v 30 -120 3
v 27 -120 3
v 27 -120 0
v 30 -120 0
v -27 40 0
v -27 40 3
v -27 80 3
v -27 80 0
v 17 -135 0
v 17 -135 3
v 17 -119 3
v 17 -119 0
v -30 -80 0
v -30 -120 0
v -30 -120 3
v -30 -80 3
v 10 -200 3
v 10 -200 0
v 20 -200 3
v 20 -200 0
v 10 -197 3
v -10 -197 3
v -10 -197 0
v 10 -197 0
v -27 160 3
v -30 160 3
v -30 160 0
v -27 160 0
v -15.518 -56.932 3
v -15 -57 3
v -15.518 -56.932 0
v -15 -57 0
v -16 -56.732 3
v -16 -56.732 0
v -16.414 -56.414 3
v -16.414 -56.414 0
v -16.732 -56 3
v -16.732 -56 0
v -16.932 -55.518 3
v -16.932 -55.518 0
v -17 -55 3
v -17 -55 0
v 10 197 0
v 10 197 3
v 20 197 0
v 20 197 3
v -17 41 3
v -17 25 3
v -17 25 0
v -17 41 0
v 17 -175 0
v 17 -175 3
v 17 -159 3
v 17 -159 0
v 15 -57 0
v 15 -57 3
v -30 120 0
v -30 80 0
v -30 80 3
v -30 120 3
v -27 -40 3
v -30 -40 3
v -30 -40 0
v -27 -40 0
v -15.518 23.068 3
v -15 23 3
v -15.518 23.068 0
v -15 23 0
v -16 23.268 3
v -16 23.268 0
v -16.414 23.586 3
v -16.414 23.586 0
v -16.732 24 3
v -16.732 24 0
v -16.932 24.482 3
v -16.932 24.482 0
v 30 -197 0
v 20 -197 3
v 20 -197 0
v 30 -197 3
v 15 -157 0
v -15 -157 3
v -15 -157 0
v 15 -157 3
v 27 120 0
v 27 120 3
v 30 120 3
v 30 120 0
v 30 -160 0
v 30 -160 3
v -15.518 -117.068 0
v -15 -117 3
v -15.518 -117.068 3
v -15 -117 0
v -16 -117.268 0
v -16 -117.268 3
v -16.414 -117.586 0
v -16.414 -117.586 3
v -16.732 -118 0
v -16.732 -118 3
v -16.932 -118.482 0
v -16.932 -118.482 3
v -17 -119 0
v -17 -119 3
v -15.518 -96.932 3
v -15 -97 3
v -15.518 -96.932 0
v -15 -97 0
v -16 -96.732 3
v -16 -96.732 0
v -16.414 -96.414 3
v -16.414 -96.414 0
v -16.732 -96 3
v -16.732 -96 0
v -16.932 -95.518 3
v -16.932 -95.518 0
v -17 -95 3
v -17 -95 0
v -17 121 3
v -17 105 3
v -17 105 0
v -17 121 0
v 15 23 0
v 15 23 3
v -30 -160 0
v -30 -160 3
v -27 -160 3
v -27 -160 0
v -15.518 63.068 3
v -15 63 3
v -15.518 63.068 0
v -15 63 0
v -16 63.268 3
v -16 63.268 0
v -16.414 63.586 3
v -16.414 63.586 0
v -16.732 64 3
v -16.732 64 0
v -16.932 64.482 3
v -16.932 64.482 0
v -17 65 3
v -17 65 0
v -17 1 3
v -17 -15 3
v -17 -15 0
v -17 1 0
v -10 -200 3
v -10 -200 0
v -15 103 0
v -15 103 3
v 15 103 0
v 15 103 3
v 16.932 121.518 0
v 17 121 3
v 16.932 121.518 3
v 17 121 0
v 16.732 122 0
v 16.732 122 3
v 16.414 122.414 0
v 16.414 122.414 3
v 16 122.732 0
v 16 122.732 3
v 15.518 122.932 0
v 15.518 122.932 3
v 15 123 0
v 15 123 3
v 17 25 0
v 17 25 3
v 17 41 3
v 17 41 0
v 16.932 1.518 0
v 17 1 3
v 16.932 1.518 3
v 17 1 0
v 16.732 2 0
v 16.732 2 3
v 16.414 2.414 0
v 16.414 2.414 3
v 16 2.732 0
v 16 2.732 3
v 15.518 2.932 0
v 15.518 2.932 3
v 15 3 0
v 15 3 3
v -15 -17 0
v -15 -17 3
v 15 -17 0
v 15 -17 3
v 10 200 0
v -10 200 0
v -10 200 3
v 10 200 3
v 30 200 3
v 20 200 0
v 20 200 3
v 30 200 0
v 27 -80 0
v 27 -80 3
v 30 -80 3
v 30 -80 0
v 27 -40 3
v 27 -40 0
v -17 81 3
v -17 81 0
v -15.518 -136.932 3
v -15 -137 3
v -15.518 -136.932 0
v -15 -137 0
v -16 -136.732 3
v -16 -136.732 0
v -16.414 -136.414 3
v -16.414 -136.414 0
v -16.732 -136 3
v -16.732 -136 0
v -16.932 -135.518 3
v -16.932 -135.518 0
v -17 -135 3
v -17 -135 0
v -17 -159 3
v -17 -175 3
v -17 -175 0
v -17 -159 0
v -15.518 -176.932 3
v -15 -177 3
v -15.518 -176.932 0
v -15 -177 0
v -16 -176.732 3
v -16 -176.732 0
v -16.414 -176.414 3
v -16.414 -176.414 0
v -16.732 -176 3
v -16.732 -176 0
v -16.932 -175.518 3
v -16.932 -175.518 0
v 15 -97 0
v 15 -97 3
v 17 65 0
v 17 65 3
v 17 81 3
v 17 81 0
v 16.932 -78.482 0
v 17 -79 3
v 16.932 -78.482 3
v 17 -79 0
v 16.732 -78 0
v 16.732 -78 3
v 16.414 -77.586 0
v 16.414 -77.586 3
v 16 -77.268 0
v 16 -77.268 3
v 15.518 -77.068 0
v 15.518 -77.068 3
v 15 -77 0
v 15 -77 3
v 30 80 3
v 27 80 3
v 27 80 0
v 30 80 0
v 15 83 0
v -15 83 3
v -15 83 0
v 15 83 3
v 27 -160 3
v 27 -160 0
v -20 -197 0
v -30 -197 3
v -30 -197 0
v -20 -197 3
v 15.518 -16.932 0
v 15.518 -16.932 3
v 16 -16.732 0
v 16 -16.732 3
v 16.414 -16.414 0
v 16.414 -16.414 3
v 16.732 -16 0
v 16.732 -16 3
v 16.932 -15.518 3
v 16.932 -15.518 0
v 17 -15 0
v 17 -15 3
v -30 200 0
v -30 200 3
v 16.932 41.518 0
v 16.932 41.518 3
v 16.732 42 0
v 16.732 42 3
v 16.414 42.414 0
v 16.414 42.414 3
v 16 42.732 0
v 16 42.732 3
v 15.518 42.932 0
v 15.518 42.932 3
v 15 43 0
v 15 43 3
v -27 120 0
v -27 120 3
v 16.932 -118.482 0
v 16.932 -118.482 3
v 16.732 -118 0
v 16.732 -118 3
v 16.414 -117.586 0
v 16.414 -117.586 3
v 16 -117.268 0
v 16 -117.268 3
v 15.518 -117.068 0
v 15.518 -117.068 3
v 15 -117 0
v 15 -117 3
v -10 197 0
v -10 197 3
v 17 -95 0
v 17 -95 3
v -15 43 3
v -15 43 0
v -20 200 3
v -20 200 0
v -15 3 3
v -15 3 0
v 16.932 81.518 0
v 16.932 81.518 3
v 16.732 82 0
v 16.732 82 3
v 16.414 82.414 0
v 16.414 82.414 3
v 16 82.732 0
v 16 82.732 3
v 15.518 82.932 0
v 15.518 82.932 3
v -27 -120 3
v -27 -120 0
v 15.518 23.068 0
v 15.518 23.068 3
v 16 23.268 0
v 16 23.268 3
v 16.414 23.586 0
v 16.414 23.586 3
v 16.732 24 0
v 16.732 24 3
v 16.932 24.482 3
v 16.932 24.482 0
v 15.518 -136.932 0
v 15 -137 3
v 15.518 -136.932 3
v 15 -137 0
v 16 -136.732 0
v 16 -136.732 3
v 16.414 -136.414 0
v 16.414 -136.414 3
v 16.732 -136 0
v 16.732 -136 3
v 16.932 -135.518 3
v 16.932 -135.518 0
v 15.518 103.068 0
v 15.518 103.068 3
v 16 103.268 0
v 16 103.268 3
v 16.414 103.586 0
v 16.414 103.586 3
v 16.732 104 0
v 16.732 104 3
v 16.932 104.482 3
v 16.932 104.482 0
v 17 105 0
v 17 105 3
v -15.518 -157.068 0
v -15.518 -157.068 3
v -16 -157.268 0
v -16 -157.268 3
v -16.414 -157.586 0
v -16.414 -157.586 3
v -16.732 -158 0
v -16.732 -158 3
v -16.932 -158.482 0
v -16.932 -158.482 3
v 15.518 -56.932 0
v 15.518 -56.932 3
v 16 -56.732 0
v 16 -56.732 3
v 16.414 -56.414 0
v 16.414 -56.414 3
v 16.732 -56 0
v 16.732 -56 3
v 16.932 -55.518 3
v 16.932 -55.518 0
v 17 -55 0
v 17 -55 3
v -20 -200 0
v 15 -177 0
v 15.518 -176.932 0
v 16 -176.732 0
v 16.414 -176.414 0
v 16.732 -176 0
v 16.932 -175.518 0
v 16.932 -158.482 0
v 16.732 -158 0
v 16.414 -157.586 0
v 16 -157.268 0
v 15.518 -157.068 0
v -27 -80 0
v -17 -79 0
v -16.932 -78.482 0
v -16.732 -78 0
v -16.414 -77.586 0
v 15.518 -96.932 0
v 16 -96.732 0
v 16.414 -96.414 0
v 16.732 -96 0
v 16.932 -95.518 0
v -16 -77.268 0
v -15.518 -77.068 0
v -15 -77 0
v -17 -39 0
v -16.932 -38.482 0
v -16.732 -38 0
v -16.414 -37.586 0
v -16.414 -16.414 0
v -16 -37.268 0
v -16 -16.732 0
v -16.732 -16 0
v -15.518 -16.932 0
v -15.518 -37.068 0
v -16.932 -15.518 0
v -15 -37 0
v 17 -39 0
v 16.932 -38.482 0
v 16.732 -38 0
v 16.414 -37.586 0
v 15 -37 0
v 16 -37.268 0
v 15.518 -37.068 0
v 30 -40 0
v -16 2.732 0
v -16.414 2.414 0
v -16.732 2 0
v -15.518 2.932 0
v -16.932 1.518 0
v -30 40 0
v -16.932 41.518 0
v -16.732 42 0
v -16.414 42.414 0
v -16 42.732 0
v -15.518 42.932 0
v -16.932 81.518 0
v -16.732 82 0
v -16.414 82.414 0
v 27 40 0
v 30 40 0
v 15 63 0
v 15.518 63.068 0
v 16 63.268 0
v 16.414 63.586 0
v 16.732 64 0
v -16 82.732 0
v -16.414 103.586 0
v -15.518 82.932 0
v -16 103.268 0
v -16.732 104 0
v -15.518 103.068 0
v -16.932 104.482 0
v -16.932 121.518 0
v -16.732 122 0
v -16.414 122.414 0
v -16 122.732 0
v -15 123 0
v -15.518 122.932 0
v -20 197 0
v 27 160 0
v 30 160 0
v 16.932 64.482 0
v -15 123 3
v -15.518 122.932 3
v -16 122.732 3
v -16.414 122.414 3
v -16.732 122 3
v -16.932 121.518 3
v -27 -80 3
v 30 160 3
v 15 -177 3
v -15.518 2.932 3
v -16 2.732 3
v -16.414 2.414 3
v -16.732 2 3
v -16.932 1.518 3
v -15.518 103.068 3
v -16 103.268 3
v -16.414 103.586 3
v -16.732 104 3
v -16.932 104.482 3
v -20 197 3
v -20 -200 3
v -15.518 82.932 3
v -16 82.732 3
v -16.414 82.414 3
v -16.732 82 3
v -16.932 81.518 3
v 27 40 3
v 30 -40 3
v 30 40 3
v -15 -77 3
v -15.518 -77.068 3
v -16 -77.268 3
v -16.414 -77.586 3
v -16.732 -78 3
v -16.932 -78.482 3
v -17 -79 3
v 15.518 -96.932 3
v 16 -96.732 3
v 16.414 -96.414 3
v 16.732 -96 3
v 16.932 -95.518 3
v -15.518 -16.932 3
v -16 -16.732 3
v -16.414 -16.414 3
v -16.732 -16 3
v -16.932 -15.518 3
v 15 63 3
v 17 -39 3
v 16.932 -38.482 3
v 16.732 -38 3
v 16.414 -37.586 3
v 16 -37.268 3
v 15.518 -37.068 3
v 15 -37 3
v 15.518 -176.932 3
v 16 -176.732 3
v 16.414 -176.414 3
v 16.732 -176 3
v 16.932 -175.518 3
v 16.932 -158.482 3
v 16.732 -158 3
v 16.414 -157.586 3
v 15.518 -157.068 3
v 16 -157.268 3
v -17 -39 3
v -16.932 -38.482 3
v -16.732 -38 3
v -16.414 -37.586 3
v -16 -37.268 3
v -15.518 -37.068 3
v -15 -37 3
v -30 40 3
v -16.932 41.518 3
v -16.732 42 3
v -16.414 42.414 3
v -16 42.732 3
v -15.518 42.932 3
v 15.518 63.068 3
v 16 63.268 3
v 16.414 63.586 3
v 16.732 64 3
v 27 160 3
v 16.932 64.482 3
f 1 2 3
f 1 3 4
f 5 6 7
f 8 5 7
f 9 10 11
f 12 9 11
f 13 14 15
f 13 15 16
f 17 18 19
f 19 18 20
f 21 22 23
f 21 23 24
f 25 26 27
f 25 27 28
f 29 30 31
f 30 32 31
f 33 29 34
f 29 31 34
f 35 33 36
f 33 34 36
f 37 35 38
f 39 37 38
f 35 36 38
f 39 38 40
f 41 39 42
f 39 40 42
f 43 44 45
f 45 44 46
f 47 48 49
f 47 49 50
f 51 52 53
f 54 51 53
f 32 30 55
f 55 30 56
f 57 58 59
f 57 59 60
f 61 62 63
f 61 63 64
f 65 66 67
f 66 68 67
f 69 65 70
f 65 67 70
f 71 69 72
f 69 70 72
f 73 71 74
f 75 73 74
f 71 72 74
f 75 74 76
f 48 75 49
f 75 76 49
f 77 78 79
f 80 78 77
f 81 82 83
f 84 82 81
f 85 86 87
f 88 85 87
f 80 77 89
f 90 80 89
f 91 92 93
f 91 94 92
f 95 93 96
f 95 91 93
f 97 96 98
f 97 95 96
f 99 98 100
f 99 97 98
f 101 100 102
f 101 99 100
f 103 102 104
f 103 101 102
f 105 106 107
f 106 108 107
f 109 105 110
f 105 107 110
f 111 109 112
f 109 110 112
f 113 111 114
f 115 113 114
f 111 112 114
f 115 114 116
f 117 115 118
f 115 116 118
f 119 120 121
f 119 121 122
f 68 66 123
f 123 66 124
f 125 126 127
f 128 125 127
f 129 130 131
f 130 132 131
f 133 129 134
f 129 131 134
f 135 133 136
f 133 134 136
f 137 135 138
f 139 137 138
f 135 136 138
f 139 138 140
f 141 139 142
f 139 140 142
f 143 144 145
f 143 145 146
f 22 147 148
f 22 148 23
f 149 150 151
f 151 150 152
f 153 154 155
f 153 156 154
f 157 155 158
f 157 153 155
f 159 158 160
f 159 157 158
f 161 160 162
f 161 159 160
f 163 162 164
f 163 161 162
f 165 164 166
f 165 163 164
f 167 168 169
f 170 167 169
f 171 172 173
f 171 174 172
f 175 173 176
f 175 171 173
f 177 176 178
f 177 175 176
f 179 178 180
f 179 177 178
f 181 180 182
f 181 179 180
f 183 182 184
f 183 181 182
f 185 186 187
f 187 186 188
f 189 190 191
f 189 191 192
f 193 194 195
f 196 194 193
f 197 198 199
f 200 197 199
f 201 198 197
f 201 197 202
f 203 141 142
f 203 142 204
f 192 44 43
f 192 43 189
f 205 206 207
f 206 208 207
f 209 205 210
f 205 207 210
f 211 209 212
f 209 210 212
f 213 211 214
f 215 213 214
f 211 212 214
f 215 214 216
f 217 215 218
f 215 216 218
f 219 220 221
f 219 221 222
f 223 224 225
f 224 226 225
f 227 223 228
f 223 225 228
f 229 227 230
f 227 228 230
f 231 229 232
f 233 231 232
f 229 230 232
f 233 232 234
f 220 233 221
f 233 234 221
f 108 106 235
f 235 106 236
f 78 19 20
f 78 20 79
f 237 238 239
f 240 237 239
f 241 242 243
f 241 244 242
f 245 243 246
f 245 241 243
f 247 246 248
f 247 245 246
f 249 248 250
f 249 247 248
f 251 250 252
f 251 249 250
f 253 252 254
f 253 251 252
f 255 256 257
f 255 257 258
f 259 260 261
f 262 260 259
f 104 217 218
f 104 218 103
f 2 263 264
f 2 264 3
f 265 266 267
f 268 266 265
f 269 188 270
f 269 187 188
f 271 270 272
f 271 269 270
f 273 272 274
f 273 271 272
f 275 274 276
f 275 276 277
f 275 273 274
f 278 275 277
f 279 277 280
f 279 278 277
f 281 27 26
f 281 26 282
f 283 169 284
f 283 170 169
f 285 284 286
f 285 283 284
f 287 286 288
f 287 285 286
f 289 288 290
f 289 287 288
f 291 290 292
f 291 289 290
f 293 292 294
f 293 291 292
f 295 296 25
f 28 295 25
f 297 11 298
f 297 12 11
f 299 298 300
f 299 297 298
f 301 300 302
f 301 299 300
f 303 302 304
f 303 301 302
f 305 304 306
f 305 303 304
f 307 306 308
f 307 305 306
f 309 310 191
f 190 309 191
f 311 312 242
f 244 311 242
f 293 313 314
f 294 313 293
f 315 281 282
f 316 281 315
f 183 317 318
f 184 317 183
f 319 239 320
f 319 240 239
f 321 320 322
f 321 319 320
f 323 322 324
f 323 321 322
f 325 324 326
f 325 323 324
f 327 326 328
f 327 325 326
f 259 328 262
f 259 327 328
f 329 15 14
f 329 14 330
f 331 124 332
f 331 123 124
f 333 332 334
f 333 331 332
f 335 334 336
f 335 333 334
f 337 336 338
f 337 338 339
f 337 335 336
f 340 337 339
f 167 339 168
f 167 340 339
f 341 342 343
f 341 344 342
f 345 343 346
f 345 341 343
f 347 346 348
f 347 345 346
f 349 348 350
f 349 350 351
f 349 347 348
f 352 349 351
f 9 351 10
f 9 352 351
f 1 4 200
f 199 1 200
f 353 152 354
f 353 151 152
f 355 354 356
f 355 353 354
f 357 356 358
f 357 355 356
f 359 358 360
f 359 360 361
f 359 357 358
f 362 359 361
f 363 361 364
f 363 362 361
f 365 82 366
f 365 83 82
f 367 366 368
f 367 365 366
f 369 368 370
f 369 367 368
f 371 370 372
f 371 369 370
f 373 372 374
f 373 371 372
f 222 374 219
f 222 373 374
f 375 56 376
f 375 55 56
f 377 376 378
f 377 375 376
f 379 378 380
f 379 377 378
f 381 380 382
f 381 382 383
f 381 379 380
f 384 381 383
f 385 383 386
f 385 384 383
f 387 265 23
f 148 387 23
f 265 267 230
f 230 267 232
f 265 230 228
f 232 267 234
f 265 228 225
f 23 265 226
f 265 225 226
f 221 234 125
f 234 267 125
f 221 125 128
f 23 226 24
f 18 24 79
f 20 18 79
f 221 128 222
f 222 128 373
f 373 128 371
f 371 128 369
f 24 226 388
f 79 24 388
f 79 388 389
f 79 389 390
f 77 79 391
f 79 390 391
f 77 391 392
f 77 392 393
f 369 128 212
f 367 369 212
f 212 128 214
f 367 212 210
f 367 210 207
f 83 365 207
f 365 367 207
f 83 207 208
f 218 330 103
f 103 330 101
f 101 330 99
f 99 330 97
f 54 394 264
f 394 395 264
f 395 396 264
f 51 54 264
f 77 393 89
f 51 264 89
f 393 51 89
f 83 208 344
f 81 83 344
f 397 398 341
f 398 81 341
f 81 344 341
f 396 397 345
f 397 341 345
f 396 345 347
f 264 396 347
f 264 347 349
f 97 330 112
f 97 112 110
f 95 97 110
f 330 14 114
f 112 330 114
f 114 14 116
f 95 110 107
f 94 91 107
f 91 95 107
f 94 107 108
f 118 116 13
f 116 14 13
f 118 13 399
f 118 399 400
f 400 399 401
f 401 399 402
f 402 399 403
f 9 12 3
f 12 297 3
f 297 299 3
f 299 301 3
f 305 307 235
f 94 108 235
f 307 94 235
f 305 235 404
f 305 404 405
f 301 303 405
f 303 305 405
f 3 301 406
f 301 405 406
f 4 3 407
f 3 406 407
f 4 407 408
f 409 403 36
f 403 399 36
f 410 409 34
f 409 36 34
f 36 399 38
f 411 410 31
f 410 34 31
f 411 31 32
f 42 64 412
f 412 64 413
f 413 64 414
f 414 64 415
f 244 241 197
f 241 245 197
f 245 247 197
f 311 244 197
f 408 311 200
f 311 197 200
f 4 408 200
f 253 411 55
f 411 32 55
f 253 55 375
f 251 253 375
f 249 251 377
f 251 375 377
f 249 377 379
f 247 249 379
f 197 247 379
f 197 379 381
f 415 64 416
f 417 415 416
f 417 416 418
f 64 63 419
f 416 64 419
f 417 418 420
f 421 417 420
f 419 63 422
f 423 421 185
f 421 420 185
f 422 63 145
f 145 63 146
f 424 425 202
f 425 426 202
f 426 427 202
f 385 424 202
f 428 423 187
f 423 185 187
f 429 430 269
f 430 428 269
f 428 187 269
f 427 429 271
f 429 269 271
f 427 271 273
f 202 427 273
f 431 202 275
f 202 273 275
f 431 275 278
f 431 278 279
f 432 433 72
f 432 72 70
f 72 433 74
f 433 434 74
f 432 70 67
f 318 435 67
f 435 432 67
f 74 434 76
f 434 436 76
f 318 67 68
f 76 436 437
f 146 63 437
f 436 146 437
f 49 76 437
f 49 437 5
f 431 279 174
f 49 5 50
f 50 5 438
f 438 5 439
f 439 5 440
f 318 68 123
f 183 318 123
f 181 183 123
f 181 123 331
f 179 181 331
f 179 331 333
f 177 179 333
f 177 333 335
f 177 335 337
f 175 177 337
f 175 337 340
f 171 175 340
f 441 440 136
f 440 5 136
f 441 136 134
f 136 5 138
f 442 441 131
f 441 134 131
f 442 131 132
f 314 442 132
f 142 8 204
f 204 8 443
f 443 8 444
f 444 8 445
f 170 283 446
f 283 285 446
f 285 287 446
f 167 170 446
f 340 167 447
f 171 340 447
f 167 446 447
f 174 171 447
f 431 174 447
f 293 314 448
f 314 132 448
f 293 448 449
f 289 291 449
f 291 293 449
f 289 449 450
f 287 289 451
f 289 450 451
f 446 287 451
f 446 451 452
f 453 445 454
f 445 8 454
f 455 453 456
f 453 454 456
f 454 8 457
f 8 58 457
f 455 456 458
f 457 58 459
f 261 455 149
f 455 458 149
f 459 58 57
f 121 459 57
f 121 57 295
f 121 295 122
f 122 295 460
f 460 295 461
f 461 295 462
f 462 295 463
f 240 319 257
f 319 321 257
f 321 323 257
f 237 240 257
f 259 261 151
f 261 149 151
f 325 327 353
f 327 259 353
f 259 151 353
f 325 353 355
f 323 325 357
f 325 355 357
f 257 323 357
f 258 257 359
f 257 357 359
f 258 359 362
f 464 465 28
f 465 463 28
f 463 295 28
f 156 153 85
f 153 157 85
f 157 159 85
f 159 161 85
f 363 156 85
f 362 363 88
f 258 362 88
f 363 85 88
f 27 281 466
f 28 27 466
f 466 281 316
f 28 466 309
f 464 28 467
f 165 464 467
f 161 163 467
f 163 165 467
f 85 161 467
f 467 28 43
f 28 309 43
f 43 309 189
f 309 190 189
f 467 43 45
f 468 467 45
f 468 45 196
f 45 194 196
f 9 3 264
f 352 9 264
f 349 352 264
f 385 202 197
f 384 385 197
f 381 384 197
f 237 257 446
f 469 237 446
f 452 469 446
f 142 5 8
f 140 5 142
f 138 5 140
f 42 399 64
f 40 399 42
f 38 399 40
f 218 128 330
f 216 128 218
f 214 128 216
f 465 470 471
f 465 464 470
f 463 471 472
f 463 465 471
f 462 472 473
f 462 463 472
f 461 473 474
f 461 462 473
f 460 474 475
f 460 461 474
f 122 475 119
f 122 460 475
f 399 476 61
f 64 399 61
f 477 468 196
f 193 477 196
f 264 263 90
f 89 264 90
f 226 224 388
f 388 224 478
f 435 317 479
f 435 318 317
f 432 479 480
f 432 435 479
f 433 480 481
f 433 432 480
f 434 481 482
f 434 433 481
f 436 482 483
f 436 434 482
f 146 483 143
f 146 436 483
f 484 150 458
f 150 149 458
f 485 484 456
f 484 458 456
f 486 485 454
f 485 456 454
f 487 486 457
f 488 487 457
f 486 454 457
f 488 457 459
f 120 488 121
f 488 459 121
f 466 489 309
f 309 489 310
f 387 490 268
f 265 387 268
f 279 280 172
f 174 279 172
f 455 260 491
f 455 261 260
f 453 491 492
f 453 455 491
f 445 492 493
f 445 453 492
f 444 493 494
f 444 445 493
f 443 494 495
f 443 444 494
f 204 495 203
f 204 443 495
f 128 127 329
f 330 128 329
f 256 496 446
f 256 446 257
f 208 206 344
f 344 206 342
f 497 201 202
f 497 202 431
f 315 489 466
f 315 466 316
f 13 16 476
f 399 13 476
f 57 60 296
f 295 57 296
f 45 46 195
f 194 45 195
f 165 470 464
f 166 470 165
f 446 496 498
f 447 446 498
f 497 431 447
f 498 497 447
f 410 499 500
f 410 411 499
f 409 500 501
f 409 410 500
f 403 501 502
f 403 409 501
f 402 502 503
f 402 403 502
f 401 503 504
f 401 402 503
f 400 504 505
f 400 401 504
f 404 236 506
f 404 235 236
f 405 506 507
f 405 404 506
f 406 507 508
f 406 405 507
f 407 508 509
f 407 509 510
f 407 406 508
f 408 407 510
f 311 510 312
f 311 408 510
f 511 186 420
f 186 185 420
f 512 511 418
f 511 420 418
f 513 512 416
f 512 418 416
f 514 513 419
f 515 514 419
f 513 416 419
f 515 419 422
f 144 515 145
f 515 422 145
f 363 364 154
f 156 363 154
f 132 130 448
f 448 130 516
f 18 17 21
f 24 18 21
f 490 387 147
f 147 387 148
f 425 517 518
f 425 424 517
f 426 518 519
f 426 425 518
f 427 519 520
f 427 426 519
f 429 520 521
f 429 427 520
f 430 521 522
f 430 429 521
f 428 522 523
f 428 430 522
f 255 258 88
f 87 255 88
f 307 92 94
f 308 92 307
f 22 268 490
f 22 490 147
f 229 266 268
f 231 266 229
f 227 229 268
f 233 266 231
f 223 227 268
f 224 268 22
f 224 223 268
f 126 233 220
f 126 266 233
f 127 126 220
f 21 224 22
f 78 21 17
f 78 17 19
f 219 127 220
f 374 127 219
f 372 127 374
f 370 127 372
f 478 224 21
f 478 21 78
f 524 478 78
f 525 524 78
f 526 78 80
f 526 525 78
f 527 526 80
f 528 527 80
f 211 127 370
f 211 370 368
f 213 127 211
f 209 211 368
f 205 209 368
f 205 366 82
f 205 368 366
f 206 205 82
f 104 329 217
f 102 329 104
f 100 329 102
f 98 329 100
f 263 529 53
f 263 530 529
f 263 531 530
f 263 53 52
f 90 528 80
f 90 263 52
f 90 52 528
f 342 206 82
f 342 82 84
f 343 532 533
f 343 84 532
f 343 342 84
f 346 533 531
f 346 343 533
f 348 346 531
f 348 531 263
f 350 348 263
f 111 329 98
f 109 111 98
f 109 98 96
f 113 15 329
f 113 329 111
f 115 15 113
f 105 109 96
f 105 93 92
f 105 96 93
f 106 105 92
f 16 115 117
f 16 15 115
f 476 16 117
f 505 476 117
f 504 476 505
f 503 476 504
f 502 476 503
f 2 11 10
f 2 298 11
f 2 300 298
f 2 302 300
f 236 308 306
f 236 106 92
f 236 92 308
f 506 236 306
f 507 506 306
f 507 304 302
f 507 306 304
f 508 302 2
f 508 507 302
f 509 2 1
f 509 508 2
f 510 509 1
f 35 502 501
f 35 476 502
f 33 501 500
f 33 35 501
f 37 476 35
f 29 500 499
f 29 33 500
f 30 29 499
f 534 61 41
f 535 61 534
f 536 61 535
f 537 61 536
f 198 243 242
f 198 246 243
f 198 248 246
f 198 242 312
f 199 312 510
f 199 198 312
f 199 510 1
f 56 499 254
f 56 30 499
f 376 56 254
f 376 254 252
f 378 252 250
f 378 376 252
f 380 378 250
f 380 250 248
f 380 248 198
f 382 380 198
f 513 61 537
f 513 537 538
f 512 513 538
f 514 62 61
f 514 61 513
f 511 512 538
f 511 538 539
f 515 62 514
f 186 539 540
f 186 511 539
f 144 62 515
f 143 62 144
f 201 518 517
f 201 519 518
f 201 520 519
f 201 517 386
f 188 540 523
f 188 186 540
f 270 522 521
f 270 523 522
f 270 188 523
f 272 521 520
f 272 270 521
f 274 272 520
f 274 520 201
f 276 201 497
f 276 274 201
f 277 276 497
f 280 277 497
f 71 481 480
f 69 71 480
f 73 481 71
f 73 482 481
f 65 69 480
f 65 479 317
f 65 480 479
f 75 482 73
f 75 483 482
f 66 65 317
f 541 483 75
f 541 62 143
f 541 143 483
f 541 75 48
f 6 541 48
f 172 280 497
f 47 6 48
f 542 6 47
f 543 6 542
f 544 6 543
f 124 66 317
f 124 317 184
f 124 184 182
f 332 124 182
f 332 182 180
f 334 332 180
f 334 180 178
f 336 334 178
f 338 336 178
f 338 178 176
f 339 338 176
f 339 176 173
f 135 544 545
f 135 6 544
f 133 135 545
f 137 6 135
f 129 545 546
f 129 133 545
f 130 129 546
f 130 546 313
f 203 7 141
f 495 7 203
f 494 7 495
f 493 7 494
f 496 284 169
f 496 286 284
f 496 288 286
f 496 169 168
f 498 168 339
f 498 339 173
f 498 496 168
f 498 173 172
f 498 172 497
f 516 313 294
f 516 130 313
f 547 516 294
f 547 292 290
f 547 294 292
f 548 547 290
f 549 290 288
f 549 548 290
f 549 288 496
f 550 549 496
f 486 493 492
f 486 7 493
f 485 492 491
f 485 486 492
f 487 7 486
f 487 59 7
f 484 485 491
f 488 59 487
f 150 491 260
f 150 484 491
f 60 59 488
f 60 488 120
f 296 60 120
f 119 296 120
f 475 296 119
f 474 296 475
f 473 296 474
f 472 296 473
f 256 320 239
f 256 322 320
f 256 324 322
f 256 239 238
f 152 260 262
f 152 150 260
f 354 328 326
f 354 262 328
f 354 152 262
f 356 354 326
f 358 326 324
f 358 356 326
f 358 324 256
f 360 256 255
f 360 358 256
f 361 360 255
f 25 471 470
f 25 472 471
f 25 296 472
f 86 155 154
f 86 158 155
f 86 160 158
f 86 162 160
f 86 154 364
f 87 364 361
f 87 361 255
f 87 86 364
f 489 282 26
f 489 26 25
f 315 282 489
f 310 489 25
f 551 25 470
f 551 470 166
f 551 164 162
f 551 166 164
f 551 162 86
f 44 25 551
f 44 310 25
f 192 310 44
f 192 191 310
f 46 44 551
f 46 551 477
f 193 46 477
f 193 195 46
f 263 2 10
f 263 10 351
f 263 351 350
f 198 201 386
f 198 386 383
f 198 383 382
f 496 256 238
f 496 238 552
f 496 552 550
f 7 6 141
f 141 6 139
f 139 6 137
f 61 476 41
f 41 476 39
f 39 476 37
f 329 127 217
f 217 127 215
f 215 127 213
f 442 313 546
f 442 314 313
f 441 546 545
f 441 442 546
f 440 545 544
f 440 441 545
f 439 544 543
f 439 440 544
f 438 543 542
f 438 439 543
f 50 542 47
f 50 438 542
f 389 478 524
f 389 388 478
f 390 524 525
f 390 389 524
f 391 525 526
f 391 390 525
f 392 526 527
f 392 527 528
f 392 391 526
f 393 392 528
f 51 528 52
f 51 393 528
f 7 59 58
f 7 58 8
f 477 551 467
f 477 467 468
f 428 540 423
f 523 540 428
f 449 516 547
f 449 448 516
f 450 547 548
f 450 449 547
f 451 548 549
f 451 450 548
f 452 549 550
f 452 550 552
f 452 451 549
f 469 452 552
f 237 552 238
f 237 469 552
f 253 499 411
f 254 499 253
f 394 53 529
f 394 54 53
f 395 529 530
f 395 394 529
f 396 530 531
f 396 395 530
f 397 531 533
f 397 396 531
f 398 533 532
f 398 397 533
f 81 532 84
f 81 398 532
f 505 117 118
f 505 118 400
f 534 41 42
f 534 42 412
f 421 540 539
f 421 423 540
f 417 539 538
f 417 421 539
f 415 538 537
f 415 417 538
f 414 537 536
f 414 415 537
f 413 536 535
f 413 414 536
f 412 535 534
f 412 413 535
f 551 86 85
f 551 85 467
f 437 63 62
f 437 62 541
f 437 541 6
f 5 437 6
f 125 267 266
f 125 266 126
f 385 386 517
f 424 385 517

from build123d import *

# Parameters (mm, degrees)
SKETCH1_W           = 60
SKETCH1_H           = 400
BOSS_EXTRUDE1_DEPTH = 3
SKETCH2_W           = 3
SKETCH2_H           = 40
SKETCH2_W_2         = 10
SKETCH2_H_2         = 3
SKETCH2_W_3         = 7
SKETCH2_W_4         = 20
CUT_EXTRUDE3_DEPTH  = 3
SKETCH3_W           = 3
SKETCH3_H           = 3
CUT_EXTRUDE4_DEPTH  = 3
SKETCH4_W           = 34
SKETCH4_H           = 20
CUT_EXTRUDE5_DEPTH  = 3
FILLET1_R           = 2


with BuildPart() as part:
    # Sketch1 → Boss-Extrude1 (new body)
    with BuildSketch(Plane.XY):
        Rectangle(SKETCH1_W, SKETCH1_H)
    extrude(amount=BOSS_EXTRUDE1_DEPTH)

    # Sketch2 → Cut-Extrude3 (cut)
    with BuildSketch(Plane.XY.offset(3)):
        with Locations((-28.5, 60)):
            Rectangle(SKETCH2_W, SKETCH2_H)
        with Locations((-28.5, -60)):
            Rectangle(SKETCH2_W, SKETCH2_H)
        with Locations((-28.5, 140)):
            Rectangle(SKETCH2_W, SKETCH2_H)
        with Locations((-28.5, -140)):
            Rectangle(SKETCH2_W, SKETCH2_H)
        with Locations((-15, 198.5)):
            Rectangle(SKETCH2_W_2, SKETCH2_H_2)
        with Locations((-23.5, -198.5)):
            Rectangle(SKETCH2_W_3, SKETCH2_H_2)
        with Locations((15, 198.5)):
            Rectangle(SKETCH2_W_2, SKETCH2_H_2)
        with Locations((0, -198.5)):
            Rectangle(SKETCH2_W_4, SKETCH2_H_2)
        with Locations((23.5, -198.5)):
            Rectangle(SKETCH2_W_3, SKETCH2_H_2)
        with Locations((28.5, 140)):
            Rectangle(SKETCH2_W, SKETCH2_H)
        with Locations((28.5, -140)):
            Rectangle(SKETCH2_W, SKETCH2_H)
        with Locations((28.5, 60)):
            Rectangle(SKETCH2_W, SKETCH2_H)
        with Locations((28.5, -60)):
            Rectangle(SKETCH2_W, SKETCH2_H)
    extrude(amount=-CUT_EXTRUDE3_DEPTH, mode=Mode.SUBTRACT)

    # Sketch3 → Cut-Extrude4 (cut)
    with BuildSketch(Plane.XY.offset(3)):
        with Locations((-28.5, -198.5)):
            Rectangle(SKETCH3_W, SKETCH3_H)
        with Locations((28.5, -198.5)):
            Rectangle(SKETCH3_W, SKETCH3_H)
    extrude(amount=-CUT_EXTRUDE4_DEPTH, mode=Mode.SUBTRACT)

    # Sketch4 → Cut-Extrude5 (cut)
    with BuildSketch(Plane.XY.offset(3)):
        with Locations((0, -167)):
            Rectangle(SKETCH4_W, SKETCH4_H)
        with Locations((0, -127)):
            Rectangle(SKETCH4_W, SKETCH4_H)
        with Locations((0, -87)):
            Rectangle(SKETCH4_W, SKETCH4_H)
        with Locations((0, -47)):
            Rectangle(SKETCH4_W, SKETCH4_H)
        with Locations((0, -7)):
            Rectangle(SKETCH4_W, SKETCH4_H)
        with Locations((0, 33)):
            Rectangle(SKETCH4_W, SKETCH4_H)
        with Locations((0, 73)):
            Rectangle(SKETCH4_W, SKETCH4_H)
        with Locations((0, 113)):
            Rectangle(SKETCH4_W, SKETCH4_H)
    extrude(amount=-CUT_EXTRUDE5_DEPTH, mode=Mode.SUBTRACT)

    # Fillet1
    fillet1_edges = [part.edges().sort_by_distance(p)[0] for p in [
        (17, -157, 1.5),
        (17, -177, 1.5),
        (-17, -177, 1.5),
        (-17, -157, 1.5),
        (17, -117, 1.5),
        (17, -137, 1.5),
        (-17, -137, 1.5),
        (-17, -117, 1.5),
        (17, -77, 1.5),
        (17, -97, 1.5),
        (-17, -97, 1.5),
        (-17, -77, 1.5),
        (17, -37, 1.5),
        (17, -57, 1.5),
        (-17, -57, 1.5),
        (-17, -37, 1.5),
        (17, 3, 1.5),
        (17, -17, 1.5),
        (-17, -17, 1.5),
        (-17, 3, 1.5),
        (17, 43, 1.5),
        (17, 23, 1.5),
        (-17, 23, 1.5),
        (-17, 43, 1.5),
        (17, 83, 1.5),
        (17, 63, 1.5),
        (-17, 63, 1.5),
        (-17, 83, 1.5),
        (17, 123, 1.5),
        (17, 103, 1.5),
        (-17, 103, 1.5),
        (-17, 123, 1.5),
    ]]
    fillet(fillet1_edges, radius=FILLET1_R)


solid = part.part
